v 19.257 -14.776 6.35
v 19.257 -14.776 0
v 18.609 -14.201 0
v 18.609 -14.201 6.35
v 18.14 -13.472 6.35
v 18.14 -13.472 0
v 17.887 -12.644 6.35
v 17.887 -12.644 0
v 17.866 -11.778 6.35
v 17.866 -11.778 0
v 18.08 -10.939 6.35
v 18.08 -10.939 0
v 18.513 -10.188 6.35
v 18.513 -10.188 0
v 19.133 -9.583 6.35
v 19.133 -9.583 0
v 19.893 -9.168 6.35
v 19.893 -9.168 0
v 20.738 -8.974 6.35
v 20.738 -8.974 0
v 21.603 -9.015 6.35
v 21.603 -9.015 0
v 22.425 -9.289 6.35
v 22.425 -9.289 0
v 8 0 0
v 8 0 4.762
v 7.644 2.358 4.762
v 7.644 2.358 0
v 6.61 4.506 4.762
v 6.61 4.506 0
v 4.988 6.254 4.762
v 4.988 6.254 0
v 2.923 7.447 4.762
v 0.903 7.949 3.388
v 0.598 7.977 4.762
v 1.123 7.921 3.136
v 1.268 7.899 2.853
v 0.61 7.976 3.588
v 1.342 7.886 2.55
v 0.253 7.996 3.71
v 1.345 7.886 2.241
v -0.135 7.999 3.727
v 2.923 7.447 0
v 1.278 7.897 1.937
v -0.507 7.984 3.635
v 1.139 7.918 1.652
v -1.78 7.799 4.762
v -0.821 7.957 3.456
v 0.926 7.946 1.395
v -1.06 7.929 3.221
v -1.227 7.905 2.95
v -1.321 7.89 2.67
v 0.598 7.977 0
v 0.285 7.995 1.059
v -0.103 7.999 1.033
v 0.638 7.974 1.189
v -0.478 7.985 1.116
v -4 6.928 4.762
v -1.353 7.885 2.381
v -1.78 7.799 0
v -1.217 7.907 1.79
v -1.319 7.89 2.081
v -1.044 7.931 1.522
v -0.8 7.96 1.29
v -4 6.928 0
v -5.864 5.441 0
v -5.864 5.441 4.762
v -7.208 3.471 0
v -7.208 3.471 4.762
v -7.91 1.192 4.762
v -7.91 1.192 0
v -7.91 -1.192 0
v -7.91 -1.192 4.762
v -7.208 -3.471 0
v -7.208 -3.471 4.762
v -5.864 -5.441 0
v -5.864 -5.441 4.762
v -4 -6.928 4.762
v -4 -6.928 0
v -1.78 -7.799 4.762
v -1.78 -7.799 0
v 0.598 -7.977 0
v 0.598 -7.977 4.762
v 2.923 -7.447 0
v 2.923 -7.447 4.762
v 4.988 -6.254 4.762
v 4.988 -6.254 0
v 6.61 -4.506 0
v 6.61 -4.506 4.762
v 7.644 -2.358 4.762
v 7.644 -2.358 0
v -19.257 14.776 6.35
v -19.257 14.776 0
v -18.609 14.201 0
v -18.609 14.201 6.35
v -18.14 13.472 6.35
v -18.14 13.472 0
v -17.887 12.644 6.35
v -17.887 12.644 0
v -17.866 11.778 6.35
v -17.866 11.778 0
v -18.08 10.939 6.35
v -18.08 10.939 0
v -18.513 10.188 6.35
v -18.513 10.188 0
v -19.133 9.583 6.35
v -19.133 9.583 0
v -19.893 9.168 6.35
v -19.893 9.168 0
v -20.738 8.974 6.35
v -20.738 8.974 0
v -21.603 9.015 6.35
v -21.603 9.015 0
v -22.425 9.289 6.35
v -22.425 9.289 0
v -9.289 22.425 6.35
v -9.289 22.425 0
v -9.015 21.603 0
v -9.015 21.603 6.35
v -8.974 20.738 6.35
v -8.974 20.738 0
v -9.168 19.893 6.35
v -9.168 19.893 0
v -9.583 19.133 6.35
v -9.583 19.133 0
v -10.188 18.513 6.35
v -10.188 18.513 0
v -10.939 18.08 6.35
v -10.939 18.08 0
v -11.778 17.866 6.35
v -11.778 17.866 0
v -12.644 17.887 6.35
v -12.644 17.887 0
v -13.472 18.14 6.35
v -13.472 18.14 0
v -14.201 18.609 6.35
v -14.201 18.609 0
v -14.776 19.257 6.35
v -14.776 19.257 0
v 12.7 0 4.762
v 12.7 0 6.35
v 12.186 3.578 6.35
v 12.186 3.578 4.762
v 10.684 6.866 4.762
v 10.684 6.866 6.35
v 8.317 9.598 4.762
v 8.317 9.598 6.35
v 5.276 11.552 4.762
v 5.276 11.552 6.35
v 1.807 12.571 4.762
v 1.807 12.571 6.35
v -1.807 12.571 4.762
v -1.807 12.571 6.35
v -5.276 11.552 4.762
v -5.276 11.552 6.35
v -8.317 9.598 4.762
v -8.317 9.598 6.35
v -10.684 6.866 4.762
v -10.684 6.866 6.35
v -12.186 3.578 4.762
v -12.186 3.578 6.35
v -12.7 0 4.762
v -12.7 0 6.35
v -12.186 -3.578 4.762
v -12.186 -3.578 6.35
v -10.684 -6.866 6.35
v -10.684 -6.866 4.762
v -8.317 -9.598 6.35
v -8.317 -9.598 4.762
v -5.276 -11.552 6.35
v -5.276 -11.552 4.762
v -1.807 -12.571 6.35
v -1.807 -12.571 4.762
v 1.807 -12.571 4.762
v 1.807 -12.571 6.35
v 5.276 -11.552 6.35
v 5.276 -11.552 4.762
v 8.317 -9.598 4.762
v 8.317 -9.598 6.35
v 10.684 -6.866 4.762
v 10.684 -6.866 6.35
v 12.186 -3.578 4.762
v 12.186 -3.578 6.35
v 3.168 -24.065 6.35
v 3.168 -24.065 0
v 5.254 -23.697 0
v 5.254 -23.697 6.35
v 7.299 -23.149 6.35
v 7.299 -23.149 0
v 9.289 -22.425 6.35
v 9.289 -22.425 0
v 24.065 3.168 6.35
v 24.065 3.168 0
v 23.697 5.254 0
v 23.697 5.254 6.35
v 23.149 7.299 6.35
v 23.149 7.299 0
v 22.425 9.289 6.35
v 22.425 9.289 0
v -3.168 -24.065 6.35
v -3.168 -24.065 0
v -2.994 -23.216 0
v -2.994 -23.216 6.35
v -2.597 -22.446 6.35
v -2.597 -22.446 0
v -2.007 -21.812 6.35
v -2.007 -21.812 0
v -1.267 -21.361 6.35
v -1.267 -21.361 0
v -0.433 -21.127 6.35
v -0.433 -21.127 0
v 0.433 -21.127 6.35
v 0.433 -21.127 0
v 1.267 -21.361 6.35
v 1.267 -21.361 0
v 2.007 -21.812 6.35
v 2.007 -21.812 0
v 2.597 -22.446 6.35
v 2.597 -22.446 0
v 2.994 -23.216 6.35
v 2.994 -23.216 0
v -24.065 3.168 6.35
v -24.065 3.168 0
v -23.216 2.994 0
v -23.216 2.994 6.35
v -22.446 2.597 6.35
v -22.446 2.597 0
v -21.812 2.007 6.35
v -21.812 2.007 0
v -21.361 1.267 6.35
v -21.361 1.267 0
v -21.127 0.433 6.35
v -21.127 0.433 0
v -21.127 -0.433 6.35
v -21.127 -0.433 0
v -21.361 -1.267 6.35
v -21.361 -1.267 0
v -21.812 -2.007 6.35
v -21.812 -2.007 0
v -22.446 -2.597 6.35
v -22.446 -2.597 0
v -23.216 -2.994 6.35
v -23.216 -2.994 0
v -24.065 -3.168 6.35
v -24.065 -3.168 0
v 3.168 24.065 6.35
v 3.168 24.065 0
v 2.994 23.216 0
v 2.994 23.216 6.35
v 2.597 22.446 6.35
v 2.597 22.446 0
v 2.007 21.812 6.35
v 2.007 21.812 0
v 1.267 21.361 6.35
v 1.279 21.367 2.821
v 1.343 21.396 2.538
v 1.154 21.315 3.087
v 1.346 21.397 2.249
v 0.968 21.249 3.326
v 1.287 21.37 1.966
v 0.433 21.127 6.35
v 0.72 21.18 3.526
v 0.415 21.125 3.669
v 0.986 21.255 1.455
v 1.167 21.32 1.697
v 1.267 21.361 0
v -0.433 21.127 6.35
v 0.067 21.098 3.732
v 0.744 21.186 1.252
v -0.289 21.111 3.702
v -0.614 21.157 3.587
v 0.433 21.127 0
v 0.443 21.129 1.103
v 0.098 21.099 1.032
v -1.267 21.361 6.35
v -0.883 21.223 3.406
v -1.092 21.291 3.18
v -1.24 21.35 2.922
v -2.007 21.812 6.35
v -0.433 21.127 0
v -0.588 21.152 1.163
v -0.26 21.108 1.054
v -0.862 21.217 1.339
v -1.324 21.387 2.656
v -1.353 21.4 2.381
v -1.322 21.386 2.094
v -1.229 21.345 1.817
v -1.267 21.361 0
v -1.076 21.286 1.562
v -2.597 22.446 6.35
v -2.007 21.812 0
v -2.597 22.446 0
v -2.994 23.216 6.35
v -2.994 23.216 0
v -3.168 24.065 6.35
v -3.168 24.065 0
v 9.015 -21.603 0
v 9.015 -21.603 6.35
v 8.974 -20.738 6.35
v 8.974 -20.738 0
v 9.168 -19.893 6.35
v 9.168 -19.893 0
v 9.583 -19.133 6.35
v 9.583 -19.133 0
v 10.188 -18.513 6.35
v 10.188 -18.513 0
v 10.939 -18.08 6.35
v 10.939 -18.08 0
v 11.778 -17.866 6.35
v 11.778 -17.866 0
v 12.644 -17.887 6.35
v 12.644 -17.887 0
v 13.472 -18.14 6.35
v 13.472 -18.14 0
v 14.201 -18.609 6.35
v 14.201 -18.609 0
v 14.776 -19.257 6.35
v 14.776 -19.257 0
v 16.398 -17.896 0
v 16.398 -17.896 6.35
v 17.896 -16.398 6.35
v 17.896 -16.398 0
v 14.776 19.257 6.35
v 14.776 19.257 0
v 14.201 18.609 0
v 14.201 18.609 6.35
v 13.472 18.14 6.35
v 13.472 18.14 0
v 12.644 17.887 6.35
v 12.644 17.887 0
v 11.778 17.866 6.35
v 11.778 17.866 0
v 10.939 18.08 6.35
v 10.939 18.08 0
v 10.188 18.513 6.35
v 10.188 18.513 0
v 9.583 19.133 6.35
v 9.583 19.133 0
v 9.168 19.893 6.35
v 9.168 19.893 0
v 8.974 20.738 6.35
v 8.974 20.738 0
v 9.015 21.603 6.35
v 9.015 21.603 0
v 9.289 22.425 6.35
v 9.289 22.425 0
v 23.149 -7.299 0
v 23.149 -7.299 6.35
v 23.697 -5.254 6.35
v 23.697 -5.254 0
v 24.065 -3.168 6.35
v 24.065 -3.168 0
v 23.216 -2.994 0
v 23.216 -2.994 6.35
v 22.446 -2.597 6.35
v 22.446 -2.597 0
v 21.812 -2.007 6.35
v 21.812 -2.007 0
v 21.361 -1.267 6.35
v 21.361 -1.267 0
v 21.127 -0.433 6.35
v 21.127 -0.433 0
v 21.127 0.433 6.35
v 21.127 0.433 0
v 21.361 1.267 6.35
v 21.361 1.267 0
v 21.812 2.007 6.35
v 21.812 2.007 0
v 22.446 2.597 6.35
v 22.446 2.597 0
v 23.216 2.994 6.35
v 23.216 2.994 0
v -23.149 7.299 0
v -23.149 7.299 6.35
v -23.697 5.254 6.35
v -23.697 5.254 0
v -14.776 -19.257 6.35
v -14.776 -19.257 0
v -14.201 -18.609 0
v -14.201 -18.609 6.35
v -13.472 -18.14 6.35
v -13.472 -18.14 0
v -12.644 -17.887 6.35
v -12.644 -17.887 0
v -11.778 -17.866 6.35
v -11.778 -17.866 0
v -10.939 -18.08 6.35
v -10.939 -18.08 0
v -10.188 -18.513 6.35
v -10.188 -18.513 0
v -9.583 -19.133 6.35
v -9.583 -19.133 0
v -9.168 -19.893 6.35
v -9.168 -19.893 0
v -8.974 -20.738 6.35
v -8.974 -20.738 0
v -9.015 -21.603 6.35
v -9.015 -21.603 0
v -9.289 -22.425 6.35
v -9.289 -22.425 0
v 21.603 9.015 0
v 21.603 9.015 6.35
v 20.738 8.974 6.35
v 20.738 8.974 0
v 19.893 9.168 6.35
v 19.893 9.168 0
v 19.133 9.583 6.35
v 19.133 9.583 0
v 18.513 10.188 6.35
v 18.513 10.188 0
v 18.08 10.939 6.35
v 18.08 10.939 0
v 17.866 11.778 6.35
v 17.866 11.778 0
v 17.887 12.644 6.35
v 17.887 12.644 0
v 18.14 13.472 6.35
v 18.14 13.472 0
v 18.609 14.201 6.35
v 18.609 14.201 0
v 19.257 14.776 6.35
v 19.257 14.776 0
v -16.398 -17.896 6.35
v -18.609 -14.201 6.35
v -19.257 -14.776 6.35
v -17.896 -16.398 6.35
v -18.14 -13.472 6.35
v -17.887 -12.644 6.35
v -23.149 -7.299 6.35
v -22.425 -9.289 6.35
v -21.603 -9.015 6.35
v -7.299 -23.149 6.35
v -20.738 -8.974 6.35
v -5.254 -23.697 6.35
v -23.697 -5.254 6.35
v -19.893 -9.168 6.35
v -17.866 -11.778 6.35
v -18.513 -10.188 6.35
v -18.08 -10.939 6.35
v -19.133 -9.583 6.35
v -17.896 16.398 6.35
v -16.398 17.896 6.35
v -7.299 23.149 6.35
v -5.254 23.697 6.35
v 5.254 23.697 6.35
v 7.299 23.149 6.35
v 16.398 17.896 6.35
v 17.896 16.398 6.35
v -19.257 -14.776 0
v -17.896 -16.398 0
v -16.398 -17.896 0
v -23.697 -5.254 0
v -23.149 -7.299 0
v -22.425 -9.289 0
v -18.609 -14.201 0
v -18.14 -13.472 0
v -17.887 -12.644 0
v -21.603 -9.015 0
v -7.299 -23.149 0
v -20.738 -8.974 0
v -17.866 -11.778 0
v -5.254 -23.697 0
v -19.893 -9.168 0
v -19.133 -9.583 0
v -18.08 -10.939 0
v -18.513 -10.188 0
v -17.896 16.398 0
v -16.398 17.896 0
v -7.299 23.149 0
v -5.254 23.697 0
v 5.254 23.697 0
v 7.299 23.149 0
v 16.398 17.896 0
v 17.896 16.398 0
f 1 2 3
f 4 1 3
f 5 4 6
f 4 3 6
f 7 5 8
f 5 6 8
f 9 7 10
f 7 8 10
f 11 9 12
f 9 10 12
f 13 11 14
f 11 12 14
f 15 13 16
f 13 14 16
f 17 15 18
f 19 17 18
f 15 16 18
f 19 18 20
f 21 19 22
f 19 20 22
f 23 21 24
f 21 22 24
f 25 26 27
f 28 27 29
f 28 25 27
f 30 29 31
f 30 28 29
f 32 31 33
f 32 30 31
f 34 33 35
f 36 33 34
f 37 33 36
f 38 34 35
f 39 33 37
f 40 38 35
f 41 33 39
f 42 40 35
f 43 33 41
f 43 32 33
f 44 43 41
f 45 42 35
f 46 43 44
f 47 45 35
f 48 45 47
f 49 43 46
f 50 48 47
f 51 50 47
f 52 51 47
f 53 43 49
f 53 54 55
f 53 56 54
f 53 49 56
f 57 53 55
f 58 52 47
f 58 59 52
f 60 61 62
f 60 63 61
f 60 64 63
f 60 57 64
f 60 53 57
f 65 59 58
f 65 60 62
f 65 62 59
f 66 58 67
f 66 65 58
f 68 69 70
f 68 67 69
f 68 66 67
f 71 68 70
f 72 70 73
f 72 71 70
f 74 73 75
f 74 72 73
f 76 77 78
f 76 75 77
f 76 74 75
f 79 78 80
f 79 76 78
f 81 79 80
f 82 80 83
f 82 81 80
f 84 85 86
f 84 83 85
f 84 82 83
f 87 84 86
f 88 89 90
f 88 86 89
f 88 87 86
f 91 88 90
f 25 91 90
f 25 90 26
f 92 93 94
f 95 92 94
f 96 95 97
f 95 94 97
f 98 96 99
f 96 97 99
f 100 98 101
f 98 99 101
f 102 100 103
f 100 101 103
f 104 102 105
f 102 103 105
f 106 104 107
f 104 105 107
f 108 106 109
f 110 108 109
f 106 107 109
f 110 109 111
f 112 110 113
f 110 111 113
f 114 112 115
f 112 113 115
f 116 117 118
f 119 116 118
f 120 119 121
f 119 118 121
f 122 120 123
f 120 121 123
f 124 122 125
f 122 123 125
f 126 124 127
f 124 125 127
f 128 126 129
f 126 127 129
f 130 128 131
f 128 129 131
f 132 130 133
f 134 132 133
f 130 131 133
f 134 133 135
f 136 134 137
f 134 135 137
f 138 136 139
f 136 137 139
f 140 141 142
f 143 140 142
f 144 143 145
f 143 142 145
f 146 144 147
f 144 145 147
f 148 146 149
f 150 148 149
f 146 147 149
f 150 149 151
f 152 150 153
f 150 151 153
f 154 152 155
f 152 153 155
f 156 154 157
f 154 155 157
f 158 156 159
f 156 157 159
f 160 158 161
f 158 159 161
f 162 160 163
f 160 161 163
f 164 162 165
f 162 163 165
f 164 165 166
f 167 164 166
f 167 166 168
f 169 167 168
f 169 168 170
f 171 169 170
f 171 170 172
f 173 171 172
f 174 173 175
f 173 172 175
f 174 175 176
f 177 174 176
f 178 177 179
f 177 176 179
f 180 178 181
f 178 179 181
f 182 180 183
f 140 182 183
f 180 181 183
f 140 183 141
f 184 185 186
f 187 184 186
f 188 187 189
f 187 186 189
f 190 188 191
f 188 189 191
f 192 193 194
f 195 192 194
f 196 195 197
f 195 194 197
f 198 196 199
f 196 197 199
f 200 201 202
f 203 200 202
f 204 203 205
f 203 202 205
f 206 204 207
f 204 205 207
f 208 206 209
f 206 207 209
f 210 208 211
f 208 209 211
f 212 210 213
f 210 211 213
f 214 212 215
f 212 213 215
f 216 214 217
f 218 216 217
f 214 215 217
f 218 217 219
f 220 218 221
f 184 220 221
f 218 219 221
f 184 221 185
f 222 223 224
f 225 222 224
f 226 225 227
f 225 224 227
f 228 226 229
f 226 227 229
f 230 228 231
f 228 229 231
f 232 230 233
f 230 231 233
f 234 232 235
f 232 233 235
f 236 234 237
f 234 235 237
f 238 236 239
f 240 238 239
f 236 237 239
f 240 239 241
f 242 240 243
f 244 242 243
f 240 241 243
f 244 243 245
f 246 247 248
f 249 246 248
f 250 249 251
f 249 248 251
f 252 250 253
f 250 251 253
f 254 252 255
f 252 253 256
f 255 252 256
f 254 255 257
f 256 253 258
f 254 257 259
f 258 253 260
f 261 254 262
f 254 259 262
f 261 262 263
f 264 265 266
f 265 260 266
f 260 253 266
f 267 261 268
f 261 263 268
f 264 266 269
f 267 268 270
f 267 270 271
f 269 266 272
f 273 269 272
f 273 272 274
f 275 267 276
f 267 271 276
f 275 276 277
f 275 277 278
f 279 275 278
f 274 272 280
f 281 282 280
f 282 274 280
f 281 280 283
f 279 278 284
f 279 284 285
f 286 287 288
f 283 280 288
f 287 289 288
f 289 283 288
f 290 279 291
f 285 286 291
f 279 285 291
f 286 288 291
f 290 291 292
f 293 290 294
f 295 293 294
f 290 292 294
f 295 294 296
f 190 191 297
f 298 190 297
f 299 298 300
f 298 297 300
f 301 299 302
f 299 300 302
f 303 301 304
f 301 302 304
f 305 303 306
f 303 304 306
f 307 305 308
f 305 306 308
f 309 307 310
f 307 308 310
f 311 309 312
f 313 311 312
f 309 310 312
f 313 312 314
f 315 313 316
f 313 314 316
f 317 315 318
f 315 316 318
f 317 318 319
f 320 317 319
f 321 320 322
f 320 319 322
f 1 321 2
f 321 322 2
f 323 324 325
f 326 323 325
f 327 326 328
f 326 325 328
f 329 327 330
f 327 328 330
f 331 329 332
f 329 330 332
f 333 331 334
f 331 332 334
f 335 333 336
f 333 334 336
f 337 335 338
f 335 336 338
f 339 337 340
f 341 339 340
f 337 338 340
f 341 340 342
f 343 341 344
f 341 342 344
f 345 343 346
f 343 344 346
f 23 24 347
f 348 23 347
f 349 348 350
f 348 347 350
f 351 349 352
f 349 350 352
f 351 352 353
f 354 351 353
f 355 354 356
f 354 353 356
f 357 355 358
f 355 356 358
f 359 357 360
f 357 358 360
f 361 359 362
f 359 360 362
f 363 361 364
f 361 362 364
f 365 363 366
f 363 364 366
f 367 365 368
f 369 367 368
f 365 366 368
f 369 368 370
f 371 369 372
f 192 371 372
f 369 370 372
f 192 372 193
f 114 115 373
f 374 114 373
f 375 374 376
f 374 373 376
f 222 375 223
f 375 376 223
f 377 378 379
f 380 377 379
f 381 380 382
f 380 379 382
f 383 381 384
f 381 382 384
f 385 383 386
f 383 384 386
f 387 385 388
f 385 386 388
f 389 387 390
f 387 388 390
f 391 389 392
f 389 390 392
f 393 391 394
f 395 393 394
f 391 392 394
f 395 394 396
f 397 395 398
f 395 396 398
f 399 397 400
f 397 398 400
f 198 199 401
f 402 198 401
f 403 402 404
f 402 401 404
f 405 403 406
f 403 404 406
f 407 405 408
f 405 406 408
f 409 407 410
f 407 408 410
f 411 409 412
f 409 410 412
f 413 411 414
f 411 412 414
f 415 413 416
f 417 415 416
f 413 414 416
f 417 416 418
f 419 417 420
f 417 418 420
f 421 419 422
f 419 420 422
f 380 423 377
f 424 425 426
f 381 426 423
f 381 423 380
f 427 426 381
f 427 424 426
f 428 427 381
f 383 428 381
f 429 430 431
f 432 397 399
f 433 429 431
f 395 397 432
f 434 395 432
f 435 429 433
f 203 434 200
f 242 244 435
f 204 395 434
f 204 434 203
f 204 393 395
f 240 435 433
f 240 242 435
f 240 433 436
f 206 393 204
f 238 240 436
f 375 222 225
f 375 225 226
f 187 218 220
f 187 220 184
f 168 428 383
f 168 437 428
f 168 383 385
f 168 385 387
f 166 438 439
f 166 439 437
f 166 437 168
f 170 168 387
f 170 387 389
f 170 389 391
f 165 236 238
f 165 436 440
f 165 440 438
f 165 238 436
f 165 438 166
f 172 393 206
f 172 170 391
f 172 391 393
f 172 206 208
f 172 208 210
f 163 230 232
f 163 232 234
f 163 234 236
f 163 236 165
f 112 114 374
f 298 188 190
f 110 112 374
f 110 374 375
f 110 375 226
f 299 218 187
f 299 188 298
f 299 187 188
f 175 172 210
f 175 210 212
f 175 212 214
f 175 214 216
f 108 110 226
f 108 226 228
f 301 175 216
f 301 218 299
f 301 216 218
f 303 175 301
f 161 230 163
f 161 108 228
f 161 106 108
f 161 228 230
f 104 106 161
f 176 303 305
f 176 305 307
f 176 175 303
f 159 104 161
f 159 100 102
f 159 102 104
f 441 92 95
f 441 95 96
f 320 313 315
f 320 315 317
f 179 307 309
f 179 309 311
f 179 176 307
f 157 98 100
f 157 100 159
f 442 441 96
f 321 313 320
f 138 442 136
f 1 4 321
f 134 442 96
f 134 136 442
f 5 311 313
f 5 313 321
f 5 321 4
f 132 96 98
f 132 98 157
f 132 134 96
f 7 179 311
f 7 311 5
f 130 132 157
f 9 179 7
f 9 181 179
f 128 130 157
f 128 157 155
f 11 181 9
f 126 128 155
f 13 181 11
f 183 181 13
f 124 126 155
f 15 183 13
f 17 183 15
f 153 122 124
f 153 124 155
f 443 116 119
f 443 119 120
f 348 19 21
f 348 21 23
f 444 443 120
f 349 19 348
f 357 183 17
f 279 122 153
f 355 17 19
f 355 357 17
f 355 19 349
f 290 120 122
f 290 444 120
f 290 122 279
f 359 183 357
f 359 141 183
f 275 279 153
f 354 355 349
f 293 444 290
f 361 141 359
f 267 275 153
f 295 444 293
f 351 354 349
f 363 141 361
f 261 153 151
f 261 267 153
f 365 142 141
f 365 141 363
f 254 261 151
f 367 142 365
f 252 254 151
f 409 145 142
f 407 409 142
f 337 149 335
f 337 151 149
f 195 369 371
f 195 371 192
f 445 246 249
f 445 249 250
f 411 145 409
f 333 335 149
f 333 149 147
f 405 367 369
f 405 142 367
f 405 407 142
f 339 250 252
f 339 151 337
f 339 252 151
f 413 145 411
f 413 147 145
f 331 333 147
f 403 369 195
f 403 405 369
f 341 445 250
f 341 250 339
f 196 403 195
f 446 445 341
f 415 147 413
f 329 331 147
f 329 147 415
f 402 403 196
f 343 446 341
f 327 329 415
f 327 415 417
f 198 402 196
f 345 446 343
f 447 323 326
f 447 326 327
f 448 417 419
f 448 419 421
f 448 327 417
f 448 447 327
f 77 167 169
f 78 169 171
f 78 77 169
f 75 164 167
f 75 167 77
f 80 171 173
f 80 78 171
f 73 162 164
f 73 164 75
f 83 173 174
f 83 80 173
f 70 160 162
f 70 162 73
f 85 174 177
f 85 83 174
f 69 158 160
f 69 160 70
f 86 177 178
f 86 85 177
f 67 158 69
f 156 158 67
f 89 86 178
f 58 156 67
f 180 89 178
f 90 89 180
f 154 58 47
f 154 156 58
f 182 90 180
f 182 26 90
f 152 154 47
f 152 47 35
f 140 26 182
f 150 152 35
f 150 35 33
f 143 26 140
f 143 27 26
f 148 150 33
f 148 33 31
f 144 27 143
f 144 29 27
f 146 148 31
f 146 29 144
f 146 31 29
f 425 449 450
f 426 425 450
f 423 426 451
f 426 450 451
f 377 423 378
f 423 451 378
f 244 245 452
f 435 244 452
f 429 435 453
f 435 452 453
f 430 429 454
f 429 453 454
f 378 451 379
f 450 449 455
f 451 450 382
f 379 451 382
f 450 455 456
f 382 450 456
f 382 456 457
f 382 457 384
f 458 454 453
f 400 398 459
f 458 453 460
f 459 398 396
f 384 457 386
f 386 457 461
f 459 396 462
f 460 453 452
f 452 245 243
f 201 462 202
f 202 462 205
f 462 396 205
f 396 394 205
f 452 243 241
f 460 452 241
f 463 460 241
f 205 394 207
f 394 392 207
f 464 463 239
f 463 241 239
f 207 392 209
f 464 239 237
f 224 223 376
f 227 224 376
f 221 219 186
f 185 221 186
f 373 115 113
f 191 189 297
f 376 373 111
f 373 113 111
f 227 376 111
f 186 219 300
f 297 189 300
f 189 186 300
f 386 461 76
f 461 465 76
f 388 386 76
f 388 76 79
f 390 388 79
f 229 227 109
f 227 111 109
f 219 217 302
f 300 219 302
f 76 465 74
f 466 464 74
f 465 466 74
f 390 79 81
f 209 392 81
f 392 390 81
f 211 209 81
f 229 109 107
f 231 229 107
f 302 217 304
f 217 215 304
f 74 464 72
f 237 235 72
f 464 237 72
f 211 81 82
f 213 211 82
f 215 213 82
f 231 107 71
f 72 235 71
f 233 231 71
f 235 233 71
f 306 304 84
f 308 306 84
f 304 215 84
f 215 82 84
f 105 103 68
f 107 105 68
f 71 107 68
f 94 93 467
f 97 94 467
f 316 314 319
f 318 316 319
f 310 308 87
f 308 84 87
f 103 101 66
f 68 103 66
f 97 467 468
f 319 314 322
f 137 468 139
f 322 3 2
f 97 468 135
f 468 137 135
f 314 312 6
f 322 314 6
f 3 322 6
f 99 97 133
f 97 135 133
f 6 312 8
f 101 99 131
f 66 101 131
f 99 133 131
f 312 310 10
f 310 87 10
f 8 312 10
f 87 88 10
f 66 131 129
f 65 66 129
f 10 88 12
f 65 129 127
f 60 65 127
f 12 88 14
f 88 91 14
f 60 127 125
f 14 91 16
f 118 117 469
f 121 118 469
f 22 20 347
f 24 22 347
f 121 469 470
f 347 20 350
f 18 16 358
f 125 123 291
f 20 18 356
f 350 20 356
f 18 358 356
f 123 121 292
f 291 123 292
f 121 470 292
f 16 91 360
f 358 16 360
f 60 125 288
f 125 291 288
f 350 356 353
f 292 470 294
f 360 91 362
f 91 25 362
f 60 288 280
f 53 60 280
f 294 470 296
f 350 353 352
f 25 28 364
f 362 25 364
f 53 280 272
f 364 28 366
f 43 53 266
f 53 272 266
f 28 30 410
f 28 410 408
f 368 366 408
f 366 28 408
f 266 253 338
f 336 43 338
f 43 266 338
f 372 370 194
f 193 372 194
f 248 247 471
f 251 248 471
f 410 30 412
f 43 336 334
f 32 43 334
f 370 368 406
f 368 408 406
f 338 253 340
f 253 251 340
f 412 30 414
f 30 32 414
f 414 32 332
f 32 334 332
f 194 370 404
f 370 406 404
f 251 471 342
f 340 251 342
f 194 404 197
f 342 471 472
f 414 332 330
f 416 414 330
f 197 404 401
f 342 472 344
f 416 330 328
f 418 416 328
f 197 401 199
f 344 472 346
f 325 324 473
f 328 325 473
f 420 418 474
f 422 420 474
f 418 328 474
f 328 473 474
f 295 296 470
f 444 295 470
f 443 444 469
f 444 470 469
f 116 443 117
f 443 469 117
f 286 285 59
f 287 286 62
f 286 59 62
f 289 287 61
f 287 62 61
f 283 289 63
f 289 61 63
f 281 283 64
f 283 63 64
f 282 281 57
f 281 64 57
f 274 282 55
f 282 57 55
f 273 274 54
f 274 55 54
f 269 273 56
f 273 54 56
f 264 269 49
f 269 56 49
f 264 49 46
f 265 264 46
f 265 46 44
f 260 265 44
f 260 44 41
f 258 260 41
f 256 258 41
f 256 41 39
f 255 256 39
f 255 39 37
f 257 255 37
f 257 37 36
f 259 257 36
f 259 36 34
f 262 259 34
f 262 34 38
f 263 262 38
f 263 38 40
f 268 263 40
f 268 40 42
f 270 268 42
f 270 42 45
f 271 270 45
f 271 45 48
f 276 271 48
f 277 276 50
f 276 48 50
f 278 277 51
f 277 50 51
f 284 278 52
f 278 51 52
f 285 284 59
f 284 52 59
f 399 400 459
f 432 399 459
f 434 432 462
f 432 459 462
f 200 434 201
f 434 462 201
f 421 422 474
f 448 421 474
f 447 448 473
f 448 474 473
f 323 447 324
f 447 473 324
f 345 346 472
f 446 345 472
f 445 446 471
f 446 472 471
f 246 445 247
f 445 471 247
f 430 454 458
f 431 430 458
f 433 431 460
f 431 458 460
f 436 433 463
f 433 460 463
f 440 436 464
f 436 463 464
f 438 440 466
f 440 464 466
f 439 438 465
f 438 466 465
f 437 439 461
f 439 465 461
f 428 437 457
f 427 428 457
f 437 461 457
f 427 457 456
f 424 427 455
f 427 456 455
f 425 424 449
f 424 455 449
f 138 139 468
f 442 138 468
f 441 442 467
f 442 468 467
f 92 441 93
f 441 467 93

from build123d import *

# Parameters (mm, degrees)
F0_R     = 7.99973
F1_DEPTH = 6.35
F2_R     = 12.7
F3_DEPTH = 1.5875
F6_D     = 2.7051
F6_DEPTH = 19.05
F6_START = 2.9673452
F6_TIP   = 0.8126940303


with BuildPart() as f1:
    # F0 (on Top) → F1 (new body)
    with BuildSketch(Plane.XY):
        with BuildLine():
            ThreePointArc((3.1682020813, 24.0648839888), (0, 21.0975389242), (-3.1682020813, 24.0648839888))
            ThreePointArc((-3.1682020813, 24.0648839888), (-6.2821953466, 23.4454722164), (-9.2886985077, 22.4249019141))
            ThreePointArc((-9.2886985077, 22.4249019141), (-10.5487694621, 18.2710046656), (-14.7761854811, 19.2566998328))
            ThreePointArc((-14.7761854811, 19.2566998328), (-17.1632768699, 17.1632768699), (-19.2566998328, 14.7761854811))
            ThreePointArc((-19.2566998328, 14.7761854811), (-18.2710046656, 10.5487694621), (-22.4249019141, 9.2886985077))
            ThreePointArc((-22.4249019141, 9.2886985077), (-23.4454722164, 6.2821953466), (-24.0648839888, 3.1682020813))
            ThreePointArc((-24.0648839888, 3.1682020813), (-21.0975389242, 0), (-24.0648839888, -3.1682020813))
            ThreePointArc((-24.0648839888, -3.1682020813), (-23.4454722164, -6.2821953466), (-22.4249019141, -9.2886985077))
            ThreePointArc((-22.4249019141, -9.2886985077), (-18.2710046656, -10.5487694621), (-19.2566998328, -14.7761854811))
            ThreePointArc((-19.2566998328, -14.7761854811), (-17.1632768699, -17.1632768699), (-14.7761854811, -19.2566998328))
            ThreePointArc((-14.7761854811, -19.2566998328), (-10.5487694621, -18.2710046656), (-9.2886985077, -22.4249019141))
            ThreePointArc((-9.2886985077, -22.4249019141), (-6.2821953466, -23.4454722164), (-3.1682020813, -24.0648839888))
            ThreePointArc((-3.1682020813, -24.0648839888), (0, -21.0975389242), (3.1682020813, -24.0648839888))
            ThreePointArc((3.1682020813, -24.0648839888), (6.2821953466, -23.4454722164), (9.2886985077, -22.4249019141))
            ThreePointArc((9.2886985077, -22.4249019141), (10.5487694621, -18.2710046656), (14.7761854811, -19.2566998328))
            ThreePointArc((14.7761854811, -19.2566998328), (17.1632768699, -17.1632768699), (19.2566998328, -14.7761854811))
            ThreePointArc((19.2566998328, -14.7761854811), (18.2710046656, -10.5487694621), (22.4249019141, -9.2886985077))
            ThreePointArc((22.4249019141, -9.2886985077), (23.4454722164, -6.2821953466), (24.0648839888, -3.1682020813))
            ThreePointArc((24.0648839888, -3.1682020813), (21.0975389242, 0), (24.0648839888, 3.1682020813))
            ThreePointArc((24.0648839888, 3.1682020813), (23.4454722164, 6.2821953466), (22.4249019141, 9.2886985077))
            ThreePointArc((22.4249019141, 9.2886985077), (18.2710046656, 10.5487694621), (19.2566998328, 14.7761854811))
            ThreePointArc((19.2566998328, 14.7761854811), (17.1632768699, 17.1632768699), (14.7761854811, 19.2566998328))
            ThreePointArc((14.7761854811, 19.2566998328), (10.5487694621, 18.2710046656), (9.2886985077, 22.4249019141))
            ThreePointArc((9.2886985077, 22.4249019141), (6.2821953466, 23.4454722164), (3.1682020813, 24.0648839888))
        make_face()
        Circle(F0_R, mode=Mode.SUBTRACT)
    extrude(amount=F1_DEPTH)

    # F2 (on face) → F3 (cut)
    with BuildSketch(Plane.XY.offset(6.35)):
        Circle(F2_R)
    extrude(amount=-F3_DEPTH, mode=Mode.SUBTRACT)

    # F6
    # its depths count from where the whole tool has entered the part; down to there all is cleared
    with Locations(Plane(origin=(0, 24.0648839888, 0), x_dir=(1, 0, 0), z_dir=(0, 1, 0)).offset(-F6_START)):
        with Locations((0, -2.38125)):
            Hole(F6_D / 2, depth=F6_DEPTH)
            with Locations((0, 0, -(F6_DEPTH + F6_TIP / 2))):  # 118° drill point
                Cone(0, F6_D / 2, F6_TIP, mode=Mode.SUBTRACT)


solid = f1.part
